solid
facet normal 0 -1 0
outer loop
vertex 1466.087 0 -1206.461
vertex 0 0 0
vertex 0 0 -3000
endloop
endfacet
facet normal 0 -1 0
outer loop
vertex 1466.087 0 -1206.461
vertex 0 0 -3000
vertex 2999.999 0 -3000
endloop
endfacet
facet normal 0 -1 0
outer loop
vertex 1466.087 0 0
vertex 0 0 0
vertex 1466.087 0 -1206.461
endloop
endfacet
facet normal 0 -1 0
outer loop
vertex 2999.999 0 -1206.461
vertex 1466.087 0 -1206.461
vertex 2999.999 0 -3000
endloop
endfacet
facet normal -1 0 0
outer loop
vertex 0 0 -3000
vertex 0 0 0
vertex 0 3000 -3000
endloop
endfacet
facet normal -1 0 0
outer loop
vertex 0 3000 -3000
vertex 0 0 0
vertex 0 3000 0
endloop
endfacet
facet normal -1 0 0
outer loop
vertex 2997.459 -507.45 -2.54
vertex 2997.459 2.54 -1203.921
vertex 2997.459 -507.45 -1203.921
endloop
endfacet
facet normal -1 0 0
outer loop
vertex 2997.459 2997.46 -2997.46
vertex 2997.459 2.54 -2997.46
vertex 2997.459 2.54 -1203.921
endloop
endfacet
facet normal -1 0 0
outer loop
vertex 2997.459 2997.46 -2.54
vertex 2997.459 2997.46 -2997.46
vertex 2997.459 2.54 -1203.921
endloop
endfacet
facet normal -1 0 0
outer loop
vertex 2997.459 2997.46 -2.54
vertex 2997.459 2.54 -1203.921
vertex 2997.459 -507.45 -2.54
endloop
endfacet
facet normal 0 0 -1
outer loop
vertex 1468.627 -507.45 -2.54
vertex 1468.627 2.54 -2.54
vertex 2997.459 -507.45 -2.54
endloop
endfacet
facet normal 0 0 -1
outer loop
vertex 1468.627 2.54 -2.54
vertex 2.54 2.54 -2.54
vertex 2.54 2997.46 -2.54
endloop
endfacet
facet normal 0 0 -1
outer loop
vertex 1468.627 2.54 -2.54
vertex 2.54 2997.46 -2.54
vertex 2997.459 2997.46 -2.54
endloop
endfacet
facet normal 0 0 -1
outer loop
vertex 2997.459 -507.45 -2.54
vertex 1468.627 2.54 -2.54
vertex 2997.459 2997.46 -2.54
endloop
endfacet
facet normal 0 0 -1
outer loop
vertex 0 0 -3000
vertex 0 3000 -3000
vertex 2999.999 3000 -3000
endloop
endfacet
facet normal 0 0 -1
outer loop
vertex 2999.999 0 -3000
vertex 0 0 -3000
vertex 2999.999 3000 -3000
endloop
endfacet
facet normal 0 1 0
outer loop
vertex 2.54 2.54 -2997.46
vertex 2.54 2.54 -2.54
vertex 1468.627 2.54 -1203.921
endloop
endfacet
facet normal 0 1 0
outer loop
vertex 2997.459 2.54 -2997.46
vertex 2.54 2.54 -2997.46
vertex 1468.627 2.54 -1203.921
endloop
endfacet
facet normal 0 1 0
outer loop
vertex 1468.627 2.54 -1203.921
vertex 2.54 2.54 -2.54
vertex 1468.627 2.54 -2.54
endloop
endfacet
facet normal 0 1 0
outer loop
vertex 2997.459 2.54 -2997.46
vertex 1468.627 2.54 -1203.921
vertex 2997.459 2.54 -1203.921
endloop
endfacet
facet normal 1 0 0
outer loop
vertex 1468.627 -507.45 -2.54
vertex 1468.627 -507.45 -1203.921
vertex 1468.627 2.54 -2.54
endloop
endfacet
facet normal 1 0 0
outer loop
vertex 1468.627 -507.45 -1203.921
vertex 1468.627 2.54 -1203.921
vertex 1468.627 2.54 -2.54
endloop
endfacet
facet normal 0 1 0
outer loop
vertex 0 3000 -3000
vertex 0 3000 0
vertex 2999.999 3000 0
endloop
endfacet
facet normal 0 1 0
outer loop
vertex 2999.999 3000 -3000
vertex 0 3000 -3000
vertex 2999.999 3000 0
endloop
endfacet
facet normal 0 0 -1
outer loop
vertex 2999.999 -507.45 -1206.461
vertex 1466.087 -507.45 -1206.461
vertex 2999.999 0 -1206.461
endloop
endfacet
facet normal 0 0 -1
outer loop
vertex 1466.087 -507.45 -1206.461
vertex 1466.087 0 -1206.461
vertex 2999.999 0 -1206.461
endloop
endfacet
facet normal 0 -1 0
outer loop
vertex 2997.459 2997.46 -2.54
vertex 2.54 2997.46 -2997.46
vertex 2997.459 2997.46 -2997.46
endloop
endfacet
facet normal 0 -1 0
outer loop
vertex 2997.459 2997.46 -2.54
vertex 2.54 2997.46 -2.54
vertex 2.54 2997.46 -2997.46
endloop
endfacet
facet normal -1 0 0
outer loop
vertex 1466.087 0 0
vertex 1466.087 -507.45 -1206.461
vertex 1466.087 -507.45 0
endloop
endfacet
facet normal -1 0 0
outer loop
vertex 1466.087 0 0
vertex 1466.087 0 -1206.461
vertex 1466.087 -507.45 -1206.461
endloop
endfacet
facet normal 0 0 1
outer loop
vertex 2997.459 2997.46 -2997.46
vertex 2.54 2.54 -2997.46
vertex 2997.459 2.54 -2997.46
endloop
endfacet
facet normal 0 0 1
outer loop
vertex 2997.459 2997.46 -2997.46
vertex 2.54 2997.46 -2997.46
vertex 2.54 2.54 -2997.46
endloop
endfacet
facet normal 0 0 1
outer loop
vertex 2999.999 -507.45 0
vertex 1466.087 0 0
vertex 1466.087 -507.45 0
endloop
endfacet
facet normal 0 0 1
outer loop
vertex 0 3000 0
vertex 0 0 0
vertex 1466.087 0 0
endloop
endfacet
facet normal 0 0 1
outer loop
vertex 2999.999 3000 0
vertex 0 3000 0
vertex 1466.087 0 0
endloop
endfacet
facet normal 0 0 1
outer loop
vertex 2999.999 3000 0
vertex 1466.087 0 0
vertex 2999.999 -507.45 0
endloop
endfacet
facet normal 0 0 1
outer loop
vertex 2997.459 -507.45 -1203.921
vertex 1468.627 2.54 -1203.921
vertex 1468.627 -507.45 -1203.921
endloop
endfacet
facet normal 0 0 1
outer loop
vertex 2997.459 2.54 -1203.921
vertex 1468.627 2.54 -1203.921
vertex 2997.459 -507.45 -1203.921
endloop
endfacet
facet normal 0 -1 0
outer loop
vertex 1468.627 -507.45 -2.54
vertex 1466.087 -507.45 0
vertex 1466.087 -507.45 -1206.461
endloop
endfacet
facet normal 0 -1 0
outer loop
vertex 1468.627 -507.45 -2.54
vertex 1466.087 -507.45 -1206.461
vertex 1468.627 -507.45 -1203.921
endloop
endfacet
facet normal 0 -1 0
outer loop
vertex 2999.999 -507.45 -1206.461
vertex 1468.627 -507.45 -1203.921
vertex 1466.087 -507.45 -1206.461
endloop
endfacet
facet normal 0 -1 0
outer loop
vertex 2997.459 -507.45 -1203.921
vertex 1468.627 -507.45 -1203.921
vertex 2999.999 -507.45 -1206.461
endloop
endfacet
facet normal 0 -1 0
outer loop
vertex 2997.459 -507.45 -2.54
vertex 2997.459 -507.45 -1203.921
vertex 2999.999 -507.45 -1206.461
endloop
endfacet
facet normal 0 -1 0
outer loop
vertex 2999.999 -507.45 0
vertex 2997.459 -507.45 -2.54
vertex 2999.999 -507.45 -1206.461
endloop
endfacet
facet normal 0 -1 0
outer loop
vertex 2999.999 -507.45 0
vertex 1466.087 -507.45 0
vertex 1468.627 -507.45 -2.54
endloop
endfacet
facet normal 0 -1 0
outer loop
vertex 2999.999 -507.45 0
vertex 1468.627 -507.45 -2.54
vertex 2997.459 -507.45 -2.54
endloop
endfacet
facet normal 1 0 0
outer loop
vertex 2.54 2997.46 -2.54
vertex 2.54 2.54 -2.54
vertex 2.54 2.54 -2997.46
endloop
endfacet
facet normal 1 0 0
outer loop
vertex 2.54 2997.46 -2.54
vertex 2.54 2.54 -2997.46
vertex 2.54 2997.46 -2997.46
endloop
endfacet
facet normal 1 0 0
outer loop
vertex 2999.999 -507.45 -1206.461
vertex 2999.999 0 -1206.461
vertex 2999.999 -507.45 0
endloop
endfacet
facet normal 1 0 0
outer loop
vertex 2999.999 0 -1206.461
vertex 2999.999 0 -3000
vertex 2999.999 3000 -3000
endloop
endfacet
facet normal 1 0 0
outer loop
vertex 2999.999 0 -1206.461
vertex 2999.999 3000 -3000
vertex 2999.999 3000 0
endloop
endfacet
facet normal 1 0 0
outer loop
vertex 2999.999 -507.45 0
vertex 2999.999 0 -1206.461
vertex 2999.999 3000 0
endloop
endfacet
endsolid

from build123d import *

# Parameters (mm, degrees)
F0_W     = 2999.9985240894
F0_H     = 3000
F2_DEPTH = 3000
F3_W     = 1533.9118980365
F3_H     = 1206.4609527588
F4_DEPTH = 456.6498994827
F6_DEPTH = 7.7816080302
F7_DEPTH = 25.4
F8_DEPTH = 25.4
F9_T     = -2.54


with BuildPart() as f2:
    # F0 (on Top) → F2 (new body)
    with BuildSketch(Plane.XY):
        with Locations((1499.9992620447, 1500)):
            Rectangle(F0_W, F0_H)
    extrude(amount=-F2_DEPTH)

    # F3 (on face) → F4 (join)
    with BuildSketch(Plane.XZ):
        with Locations((2233.0425750711, -603.2304763794)):
            Rectangle(F3_W, F3_H)
    extrude(amount=F4_DEPTH)

    # F6 (add): a face of the model
    f6_faces = [f2.faces().sort_by_distance(p)[0] for p in [
        (2233.0425750711, -456.6498994827, -603.2304763794),
    ]]
    extrude(f6_faces, amount=-F6_DEPTH)

    # F7 (add): a face of the model
    f7_faces = [f2.faces().sort_by_distance(p)[0] for p in [
        (2233.0425750711, -456.6498994827, -603.2304763794),
    ]]
    extrude(f7_faces, amount=F7_DEPTH)

    # F8 (add): a face of the model
    f8_faces = [f2.faces().sort_by_distance(p)[0] for p in [
        (2233.0425750711, -482.0498994827, -603.2304763794),
    ]]
    extrude(f8_faces, amount=F8_DEPTH)

    # F9
    f9_openings = [f2.faces().sort_by_distance(p)[0] for p in [
        (2233.042575, -507.449899, -603.230476),
    ]]
    offset(amount=F9_T, openings=f9_openings, kind=Kind.INTERSECTION)


solid = f2.part
